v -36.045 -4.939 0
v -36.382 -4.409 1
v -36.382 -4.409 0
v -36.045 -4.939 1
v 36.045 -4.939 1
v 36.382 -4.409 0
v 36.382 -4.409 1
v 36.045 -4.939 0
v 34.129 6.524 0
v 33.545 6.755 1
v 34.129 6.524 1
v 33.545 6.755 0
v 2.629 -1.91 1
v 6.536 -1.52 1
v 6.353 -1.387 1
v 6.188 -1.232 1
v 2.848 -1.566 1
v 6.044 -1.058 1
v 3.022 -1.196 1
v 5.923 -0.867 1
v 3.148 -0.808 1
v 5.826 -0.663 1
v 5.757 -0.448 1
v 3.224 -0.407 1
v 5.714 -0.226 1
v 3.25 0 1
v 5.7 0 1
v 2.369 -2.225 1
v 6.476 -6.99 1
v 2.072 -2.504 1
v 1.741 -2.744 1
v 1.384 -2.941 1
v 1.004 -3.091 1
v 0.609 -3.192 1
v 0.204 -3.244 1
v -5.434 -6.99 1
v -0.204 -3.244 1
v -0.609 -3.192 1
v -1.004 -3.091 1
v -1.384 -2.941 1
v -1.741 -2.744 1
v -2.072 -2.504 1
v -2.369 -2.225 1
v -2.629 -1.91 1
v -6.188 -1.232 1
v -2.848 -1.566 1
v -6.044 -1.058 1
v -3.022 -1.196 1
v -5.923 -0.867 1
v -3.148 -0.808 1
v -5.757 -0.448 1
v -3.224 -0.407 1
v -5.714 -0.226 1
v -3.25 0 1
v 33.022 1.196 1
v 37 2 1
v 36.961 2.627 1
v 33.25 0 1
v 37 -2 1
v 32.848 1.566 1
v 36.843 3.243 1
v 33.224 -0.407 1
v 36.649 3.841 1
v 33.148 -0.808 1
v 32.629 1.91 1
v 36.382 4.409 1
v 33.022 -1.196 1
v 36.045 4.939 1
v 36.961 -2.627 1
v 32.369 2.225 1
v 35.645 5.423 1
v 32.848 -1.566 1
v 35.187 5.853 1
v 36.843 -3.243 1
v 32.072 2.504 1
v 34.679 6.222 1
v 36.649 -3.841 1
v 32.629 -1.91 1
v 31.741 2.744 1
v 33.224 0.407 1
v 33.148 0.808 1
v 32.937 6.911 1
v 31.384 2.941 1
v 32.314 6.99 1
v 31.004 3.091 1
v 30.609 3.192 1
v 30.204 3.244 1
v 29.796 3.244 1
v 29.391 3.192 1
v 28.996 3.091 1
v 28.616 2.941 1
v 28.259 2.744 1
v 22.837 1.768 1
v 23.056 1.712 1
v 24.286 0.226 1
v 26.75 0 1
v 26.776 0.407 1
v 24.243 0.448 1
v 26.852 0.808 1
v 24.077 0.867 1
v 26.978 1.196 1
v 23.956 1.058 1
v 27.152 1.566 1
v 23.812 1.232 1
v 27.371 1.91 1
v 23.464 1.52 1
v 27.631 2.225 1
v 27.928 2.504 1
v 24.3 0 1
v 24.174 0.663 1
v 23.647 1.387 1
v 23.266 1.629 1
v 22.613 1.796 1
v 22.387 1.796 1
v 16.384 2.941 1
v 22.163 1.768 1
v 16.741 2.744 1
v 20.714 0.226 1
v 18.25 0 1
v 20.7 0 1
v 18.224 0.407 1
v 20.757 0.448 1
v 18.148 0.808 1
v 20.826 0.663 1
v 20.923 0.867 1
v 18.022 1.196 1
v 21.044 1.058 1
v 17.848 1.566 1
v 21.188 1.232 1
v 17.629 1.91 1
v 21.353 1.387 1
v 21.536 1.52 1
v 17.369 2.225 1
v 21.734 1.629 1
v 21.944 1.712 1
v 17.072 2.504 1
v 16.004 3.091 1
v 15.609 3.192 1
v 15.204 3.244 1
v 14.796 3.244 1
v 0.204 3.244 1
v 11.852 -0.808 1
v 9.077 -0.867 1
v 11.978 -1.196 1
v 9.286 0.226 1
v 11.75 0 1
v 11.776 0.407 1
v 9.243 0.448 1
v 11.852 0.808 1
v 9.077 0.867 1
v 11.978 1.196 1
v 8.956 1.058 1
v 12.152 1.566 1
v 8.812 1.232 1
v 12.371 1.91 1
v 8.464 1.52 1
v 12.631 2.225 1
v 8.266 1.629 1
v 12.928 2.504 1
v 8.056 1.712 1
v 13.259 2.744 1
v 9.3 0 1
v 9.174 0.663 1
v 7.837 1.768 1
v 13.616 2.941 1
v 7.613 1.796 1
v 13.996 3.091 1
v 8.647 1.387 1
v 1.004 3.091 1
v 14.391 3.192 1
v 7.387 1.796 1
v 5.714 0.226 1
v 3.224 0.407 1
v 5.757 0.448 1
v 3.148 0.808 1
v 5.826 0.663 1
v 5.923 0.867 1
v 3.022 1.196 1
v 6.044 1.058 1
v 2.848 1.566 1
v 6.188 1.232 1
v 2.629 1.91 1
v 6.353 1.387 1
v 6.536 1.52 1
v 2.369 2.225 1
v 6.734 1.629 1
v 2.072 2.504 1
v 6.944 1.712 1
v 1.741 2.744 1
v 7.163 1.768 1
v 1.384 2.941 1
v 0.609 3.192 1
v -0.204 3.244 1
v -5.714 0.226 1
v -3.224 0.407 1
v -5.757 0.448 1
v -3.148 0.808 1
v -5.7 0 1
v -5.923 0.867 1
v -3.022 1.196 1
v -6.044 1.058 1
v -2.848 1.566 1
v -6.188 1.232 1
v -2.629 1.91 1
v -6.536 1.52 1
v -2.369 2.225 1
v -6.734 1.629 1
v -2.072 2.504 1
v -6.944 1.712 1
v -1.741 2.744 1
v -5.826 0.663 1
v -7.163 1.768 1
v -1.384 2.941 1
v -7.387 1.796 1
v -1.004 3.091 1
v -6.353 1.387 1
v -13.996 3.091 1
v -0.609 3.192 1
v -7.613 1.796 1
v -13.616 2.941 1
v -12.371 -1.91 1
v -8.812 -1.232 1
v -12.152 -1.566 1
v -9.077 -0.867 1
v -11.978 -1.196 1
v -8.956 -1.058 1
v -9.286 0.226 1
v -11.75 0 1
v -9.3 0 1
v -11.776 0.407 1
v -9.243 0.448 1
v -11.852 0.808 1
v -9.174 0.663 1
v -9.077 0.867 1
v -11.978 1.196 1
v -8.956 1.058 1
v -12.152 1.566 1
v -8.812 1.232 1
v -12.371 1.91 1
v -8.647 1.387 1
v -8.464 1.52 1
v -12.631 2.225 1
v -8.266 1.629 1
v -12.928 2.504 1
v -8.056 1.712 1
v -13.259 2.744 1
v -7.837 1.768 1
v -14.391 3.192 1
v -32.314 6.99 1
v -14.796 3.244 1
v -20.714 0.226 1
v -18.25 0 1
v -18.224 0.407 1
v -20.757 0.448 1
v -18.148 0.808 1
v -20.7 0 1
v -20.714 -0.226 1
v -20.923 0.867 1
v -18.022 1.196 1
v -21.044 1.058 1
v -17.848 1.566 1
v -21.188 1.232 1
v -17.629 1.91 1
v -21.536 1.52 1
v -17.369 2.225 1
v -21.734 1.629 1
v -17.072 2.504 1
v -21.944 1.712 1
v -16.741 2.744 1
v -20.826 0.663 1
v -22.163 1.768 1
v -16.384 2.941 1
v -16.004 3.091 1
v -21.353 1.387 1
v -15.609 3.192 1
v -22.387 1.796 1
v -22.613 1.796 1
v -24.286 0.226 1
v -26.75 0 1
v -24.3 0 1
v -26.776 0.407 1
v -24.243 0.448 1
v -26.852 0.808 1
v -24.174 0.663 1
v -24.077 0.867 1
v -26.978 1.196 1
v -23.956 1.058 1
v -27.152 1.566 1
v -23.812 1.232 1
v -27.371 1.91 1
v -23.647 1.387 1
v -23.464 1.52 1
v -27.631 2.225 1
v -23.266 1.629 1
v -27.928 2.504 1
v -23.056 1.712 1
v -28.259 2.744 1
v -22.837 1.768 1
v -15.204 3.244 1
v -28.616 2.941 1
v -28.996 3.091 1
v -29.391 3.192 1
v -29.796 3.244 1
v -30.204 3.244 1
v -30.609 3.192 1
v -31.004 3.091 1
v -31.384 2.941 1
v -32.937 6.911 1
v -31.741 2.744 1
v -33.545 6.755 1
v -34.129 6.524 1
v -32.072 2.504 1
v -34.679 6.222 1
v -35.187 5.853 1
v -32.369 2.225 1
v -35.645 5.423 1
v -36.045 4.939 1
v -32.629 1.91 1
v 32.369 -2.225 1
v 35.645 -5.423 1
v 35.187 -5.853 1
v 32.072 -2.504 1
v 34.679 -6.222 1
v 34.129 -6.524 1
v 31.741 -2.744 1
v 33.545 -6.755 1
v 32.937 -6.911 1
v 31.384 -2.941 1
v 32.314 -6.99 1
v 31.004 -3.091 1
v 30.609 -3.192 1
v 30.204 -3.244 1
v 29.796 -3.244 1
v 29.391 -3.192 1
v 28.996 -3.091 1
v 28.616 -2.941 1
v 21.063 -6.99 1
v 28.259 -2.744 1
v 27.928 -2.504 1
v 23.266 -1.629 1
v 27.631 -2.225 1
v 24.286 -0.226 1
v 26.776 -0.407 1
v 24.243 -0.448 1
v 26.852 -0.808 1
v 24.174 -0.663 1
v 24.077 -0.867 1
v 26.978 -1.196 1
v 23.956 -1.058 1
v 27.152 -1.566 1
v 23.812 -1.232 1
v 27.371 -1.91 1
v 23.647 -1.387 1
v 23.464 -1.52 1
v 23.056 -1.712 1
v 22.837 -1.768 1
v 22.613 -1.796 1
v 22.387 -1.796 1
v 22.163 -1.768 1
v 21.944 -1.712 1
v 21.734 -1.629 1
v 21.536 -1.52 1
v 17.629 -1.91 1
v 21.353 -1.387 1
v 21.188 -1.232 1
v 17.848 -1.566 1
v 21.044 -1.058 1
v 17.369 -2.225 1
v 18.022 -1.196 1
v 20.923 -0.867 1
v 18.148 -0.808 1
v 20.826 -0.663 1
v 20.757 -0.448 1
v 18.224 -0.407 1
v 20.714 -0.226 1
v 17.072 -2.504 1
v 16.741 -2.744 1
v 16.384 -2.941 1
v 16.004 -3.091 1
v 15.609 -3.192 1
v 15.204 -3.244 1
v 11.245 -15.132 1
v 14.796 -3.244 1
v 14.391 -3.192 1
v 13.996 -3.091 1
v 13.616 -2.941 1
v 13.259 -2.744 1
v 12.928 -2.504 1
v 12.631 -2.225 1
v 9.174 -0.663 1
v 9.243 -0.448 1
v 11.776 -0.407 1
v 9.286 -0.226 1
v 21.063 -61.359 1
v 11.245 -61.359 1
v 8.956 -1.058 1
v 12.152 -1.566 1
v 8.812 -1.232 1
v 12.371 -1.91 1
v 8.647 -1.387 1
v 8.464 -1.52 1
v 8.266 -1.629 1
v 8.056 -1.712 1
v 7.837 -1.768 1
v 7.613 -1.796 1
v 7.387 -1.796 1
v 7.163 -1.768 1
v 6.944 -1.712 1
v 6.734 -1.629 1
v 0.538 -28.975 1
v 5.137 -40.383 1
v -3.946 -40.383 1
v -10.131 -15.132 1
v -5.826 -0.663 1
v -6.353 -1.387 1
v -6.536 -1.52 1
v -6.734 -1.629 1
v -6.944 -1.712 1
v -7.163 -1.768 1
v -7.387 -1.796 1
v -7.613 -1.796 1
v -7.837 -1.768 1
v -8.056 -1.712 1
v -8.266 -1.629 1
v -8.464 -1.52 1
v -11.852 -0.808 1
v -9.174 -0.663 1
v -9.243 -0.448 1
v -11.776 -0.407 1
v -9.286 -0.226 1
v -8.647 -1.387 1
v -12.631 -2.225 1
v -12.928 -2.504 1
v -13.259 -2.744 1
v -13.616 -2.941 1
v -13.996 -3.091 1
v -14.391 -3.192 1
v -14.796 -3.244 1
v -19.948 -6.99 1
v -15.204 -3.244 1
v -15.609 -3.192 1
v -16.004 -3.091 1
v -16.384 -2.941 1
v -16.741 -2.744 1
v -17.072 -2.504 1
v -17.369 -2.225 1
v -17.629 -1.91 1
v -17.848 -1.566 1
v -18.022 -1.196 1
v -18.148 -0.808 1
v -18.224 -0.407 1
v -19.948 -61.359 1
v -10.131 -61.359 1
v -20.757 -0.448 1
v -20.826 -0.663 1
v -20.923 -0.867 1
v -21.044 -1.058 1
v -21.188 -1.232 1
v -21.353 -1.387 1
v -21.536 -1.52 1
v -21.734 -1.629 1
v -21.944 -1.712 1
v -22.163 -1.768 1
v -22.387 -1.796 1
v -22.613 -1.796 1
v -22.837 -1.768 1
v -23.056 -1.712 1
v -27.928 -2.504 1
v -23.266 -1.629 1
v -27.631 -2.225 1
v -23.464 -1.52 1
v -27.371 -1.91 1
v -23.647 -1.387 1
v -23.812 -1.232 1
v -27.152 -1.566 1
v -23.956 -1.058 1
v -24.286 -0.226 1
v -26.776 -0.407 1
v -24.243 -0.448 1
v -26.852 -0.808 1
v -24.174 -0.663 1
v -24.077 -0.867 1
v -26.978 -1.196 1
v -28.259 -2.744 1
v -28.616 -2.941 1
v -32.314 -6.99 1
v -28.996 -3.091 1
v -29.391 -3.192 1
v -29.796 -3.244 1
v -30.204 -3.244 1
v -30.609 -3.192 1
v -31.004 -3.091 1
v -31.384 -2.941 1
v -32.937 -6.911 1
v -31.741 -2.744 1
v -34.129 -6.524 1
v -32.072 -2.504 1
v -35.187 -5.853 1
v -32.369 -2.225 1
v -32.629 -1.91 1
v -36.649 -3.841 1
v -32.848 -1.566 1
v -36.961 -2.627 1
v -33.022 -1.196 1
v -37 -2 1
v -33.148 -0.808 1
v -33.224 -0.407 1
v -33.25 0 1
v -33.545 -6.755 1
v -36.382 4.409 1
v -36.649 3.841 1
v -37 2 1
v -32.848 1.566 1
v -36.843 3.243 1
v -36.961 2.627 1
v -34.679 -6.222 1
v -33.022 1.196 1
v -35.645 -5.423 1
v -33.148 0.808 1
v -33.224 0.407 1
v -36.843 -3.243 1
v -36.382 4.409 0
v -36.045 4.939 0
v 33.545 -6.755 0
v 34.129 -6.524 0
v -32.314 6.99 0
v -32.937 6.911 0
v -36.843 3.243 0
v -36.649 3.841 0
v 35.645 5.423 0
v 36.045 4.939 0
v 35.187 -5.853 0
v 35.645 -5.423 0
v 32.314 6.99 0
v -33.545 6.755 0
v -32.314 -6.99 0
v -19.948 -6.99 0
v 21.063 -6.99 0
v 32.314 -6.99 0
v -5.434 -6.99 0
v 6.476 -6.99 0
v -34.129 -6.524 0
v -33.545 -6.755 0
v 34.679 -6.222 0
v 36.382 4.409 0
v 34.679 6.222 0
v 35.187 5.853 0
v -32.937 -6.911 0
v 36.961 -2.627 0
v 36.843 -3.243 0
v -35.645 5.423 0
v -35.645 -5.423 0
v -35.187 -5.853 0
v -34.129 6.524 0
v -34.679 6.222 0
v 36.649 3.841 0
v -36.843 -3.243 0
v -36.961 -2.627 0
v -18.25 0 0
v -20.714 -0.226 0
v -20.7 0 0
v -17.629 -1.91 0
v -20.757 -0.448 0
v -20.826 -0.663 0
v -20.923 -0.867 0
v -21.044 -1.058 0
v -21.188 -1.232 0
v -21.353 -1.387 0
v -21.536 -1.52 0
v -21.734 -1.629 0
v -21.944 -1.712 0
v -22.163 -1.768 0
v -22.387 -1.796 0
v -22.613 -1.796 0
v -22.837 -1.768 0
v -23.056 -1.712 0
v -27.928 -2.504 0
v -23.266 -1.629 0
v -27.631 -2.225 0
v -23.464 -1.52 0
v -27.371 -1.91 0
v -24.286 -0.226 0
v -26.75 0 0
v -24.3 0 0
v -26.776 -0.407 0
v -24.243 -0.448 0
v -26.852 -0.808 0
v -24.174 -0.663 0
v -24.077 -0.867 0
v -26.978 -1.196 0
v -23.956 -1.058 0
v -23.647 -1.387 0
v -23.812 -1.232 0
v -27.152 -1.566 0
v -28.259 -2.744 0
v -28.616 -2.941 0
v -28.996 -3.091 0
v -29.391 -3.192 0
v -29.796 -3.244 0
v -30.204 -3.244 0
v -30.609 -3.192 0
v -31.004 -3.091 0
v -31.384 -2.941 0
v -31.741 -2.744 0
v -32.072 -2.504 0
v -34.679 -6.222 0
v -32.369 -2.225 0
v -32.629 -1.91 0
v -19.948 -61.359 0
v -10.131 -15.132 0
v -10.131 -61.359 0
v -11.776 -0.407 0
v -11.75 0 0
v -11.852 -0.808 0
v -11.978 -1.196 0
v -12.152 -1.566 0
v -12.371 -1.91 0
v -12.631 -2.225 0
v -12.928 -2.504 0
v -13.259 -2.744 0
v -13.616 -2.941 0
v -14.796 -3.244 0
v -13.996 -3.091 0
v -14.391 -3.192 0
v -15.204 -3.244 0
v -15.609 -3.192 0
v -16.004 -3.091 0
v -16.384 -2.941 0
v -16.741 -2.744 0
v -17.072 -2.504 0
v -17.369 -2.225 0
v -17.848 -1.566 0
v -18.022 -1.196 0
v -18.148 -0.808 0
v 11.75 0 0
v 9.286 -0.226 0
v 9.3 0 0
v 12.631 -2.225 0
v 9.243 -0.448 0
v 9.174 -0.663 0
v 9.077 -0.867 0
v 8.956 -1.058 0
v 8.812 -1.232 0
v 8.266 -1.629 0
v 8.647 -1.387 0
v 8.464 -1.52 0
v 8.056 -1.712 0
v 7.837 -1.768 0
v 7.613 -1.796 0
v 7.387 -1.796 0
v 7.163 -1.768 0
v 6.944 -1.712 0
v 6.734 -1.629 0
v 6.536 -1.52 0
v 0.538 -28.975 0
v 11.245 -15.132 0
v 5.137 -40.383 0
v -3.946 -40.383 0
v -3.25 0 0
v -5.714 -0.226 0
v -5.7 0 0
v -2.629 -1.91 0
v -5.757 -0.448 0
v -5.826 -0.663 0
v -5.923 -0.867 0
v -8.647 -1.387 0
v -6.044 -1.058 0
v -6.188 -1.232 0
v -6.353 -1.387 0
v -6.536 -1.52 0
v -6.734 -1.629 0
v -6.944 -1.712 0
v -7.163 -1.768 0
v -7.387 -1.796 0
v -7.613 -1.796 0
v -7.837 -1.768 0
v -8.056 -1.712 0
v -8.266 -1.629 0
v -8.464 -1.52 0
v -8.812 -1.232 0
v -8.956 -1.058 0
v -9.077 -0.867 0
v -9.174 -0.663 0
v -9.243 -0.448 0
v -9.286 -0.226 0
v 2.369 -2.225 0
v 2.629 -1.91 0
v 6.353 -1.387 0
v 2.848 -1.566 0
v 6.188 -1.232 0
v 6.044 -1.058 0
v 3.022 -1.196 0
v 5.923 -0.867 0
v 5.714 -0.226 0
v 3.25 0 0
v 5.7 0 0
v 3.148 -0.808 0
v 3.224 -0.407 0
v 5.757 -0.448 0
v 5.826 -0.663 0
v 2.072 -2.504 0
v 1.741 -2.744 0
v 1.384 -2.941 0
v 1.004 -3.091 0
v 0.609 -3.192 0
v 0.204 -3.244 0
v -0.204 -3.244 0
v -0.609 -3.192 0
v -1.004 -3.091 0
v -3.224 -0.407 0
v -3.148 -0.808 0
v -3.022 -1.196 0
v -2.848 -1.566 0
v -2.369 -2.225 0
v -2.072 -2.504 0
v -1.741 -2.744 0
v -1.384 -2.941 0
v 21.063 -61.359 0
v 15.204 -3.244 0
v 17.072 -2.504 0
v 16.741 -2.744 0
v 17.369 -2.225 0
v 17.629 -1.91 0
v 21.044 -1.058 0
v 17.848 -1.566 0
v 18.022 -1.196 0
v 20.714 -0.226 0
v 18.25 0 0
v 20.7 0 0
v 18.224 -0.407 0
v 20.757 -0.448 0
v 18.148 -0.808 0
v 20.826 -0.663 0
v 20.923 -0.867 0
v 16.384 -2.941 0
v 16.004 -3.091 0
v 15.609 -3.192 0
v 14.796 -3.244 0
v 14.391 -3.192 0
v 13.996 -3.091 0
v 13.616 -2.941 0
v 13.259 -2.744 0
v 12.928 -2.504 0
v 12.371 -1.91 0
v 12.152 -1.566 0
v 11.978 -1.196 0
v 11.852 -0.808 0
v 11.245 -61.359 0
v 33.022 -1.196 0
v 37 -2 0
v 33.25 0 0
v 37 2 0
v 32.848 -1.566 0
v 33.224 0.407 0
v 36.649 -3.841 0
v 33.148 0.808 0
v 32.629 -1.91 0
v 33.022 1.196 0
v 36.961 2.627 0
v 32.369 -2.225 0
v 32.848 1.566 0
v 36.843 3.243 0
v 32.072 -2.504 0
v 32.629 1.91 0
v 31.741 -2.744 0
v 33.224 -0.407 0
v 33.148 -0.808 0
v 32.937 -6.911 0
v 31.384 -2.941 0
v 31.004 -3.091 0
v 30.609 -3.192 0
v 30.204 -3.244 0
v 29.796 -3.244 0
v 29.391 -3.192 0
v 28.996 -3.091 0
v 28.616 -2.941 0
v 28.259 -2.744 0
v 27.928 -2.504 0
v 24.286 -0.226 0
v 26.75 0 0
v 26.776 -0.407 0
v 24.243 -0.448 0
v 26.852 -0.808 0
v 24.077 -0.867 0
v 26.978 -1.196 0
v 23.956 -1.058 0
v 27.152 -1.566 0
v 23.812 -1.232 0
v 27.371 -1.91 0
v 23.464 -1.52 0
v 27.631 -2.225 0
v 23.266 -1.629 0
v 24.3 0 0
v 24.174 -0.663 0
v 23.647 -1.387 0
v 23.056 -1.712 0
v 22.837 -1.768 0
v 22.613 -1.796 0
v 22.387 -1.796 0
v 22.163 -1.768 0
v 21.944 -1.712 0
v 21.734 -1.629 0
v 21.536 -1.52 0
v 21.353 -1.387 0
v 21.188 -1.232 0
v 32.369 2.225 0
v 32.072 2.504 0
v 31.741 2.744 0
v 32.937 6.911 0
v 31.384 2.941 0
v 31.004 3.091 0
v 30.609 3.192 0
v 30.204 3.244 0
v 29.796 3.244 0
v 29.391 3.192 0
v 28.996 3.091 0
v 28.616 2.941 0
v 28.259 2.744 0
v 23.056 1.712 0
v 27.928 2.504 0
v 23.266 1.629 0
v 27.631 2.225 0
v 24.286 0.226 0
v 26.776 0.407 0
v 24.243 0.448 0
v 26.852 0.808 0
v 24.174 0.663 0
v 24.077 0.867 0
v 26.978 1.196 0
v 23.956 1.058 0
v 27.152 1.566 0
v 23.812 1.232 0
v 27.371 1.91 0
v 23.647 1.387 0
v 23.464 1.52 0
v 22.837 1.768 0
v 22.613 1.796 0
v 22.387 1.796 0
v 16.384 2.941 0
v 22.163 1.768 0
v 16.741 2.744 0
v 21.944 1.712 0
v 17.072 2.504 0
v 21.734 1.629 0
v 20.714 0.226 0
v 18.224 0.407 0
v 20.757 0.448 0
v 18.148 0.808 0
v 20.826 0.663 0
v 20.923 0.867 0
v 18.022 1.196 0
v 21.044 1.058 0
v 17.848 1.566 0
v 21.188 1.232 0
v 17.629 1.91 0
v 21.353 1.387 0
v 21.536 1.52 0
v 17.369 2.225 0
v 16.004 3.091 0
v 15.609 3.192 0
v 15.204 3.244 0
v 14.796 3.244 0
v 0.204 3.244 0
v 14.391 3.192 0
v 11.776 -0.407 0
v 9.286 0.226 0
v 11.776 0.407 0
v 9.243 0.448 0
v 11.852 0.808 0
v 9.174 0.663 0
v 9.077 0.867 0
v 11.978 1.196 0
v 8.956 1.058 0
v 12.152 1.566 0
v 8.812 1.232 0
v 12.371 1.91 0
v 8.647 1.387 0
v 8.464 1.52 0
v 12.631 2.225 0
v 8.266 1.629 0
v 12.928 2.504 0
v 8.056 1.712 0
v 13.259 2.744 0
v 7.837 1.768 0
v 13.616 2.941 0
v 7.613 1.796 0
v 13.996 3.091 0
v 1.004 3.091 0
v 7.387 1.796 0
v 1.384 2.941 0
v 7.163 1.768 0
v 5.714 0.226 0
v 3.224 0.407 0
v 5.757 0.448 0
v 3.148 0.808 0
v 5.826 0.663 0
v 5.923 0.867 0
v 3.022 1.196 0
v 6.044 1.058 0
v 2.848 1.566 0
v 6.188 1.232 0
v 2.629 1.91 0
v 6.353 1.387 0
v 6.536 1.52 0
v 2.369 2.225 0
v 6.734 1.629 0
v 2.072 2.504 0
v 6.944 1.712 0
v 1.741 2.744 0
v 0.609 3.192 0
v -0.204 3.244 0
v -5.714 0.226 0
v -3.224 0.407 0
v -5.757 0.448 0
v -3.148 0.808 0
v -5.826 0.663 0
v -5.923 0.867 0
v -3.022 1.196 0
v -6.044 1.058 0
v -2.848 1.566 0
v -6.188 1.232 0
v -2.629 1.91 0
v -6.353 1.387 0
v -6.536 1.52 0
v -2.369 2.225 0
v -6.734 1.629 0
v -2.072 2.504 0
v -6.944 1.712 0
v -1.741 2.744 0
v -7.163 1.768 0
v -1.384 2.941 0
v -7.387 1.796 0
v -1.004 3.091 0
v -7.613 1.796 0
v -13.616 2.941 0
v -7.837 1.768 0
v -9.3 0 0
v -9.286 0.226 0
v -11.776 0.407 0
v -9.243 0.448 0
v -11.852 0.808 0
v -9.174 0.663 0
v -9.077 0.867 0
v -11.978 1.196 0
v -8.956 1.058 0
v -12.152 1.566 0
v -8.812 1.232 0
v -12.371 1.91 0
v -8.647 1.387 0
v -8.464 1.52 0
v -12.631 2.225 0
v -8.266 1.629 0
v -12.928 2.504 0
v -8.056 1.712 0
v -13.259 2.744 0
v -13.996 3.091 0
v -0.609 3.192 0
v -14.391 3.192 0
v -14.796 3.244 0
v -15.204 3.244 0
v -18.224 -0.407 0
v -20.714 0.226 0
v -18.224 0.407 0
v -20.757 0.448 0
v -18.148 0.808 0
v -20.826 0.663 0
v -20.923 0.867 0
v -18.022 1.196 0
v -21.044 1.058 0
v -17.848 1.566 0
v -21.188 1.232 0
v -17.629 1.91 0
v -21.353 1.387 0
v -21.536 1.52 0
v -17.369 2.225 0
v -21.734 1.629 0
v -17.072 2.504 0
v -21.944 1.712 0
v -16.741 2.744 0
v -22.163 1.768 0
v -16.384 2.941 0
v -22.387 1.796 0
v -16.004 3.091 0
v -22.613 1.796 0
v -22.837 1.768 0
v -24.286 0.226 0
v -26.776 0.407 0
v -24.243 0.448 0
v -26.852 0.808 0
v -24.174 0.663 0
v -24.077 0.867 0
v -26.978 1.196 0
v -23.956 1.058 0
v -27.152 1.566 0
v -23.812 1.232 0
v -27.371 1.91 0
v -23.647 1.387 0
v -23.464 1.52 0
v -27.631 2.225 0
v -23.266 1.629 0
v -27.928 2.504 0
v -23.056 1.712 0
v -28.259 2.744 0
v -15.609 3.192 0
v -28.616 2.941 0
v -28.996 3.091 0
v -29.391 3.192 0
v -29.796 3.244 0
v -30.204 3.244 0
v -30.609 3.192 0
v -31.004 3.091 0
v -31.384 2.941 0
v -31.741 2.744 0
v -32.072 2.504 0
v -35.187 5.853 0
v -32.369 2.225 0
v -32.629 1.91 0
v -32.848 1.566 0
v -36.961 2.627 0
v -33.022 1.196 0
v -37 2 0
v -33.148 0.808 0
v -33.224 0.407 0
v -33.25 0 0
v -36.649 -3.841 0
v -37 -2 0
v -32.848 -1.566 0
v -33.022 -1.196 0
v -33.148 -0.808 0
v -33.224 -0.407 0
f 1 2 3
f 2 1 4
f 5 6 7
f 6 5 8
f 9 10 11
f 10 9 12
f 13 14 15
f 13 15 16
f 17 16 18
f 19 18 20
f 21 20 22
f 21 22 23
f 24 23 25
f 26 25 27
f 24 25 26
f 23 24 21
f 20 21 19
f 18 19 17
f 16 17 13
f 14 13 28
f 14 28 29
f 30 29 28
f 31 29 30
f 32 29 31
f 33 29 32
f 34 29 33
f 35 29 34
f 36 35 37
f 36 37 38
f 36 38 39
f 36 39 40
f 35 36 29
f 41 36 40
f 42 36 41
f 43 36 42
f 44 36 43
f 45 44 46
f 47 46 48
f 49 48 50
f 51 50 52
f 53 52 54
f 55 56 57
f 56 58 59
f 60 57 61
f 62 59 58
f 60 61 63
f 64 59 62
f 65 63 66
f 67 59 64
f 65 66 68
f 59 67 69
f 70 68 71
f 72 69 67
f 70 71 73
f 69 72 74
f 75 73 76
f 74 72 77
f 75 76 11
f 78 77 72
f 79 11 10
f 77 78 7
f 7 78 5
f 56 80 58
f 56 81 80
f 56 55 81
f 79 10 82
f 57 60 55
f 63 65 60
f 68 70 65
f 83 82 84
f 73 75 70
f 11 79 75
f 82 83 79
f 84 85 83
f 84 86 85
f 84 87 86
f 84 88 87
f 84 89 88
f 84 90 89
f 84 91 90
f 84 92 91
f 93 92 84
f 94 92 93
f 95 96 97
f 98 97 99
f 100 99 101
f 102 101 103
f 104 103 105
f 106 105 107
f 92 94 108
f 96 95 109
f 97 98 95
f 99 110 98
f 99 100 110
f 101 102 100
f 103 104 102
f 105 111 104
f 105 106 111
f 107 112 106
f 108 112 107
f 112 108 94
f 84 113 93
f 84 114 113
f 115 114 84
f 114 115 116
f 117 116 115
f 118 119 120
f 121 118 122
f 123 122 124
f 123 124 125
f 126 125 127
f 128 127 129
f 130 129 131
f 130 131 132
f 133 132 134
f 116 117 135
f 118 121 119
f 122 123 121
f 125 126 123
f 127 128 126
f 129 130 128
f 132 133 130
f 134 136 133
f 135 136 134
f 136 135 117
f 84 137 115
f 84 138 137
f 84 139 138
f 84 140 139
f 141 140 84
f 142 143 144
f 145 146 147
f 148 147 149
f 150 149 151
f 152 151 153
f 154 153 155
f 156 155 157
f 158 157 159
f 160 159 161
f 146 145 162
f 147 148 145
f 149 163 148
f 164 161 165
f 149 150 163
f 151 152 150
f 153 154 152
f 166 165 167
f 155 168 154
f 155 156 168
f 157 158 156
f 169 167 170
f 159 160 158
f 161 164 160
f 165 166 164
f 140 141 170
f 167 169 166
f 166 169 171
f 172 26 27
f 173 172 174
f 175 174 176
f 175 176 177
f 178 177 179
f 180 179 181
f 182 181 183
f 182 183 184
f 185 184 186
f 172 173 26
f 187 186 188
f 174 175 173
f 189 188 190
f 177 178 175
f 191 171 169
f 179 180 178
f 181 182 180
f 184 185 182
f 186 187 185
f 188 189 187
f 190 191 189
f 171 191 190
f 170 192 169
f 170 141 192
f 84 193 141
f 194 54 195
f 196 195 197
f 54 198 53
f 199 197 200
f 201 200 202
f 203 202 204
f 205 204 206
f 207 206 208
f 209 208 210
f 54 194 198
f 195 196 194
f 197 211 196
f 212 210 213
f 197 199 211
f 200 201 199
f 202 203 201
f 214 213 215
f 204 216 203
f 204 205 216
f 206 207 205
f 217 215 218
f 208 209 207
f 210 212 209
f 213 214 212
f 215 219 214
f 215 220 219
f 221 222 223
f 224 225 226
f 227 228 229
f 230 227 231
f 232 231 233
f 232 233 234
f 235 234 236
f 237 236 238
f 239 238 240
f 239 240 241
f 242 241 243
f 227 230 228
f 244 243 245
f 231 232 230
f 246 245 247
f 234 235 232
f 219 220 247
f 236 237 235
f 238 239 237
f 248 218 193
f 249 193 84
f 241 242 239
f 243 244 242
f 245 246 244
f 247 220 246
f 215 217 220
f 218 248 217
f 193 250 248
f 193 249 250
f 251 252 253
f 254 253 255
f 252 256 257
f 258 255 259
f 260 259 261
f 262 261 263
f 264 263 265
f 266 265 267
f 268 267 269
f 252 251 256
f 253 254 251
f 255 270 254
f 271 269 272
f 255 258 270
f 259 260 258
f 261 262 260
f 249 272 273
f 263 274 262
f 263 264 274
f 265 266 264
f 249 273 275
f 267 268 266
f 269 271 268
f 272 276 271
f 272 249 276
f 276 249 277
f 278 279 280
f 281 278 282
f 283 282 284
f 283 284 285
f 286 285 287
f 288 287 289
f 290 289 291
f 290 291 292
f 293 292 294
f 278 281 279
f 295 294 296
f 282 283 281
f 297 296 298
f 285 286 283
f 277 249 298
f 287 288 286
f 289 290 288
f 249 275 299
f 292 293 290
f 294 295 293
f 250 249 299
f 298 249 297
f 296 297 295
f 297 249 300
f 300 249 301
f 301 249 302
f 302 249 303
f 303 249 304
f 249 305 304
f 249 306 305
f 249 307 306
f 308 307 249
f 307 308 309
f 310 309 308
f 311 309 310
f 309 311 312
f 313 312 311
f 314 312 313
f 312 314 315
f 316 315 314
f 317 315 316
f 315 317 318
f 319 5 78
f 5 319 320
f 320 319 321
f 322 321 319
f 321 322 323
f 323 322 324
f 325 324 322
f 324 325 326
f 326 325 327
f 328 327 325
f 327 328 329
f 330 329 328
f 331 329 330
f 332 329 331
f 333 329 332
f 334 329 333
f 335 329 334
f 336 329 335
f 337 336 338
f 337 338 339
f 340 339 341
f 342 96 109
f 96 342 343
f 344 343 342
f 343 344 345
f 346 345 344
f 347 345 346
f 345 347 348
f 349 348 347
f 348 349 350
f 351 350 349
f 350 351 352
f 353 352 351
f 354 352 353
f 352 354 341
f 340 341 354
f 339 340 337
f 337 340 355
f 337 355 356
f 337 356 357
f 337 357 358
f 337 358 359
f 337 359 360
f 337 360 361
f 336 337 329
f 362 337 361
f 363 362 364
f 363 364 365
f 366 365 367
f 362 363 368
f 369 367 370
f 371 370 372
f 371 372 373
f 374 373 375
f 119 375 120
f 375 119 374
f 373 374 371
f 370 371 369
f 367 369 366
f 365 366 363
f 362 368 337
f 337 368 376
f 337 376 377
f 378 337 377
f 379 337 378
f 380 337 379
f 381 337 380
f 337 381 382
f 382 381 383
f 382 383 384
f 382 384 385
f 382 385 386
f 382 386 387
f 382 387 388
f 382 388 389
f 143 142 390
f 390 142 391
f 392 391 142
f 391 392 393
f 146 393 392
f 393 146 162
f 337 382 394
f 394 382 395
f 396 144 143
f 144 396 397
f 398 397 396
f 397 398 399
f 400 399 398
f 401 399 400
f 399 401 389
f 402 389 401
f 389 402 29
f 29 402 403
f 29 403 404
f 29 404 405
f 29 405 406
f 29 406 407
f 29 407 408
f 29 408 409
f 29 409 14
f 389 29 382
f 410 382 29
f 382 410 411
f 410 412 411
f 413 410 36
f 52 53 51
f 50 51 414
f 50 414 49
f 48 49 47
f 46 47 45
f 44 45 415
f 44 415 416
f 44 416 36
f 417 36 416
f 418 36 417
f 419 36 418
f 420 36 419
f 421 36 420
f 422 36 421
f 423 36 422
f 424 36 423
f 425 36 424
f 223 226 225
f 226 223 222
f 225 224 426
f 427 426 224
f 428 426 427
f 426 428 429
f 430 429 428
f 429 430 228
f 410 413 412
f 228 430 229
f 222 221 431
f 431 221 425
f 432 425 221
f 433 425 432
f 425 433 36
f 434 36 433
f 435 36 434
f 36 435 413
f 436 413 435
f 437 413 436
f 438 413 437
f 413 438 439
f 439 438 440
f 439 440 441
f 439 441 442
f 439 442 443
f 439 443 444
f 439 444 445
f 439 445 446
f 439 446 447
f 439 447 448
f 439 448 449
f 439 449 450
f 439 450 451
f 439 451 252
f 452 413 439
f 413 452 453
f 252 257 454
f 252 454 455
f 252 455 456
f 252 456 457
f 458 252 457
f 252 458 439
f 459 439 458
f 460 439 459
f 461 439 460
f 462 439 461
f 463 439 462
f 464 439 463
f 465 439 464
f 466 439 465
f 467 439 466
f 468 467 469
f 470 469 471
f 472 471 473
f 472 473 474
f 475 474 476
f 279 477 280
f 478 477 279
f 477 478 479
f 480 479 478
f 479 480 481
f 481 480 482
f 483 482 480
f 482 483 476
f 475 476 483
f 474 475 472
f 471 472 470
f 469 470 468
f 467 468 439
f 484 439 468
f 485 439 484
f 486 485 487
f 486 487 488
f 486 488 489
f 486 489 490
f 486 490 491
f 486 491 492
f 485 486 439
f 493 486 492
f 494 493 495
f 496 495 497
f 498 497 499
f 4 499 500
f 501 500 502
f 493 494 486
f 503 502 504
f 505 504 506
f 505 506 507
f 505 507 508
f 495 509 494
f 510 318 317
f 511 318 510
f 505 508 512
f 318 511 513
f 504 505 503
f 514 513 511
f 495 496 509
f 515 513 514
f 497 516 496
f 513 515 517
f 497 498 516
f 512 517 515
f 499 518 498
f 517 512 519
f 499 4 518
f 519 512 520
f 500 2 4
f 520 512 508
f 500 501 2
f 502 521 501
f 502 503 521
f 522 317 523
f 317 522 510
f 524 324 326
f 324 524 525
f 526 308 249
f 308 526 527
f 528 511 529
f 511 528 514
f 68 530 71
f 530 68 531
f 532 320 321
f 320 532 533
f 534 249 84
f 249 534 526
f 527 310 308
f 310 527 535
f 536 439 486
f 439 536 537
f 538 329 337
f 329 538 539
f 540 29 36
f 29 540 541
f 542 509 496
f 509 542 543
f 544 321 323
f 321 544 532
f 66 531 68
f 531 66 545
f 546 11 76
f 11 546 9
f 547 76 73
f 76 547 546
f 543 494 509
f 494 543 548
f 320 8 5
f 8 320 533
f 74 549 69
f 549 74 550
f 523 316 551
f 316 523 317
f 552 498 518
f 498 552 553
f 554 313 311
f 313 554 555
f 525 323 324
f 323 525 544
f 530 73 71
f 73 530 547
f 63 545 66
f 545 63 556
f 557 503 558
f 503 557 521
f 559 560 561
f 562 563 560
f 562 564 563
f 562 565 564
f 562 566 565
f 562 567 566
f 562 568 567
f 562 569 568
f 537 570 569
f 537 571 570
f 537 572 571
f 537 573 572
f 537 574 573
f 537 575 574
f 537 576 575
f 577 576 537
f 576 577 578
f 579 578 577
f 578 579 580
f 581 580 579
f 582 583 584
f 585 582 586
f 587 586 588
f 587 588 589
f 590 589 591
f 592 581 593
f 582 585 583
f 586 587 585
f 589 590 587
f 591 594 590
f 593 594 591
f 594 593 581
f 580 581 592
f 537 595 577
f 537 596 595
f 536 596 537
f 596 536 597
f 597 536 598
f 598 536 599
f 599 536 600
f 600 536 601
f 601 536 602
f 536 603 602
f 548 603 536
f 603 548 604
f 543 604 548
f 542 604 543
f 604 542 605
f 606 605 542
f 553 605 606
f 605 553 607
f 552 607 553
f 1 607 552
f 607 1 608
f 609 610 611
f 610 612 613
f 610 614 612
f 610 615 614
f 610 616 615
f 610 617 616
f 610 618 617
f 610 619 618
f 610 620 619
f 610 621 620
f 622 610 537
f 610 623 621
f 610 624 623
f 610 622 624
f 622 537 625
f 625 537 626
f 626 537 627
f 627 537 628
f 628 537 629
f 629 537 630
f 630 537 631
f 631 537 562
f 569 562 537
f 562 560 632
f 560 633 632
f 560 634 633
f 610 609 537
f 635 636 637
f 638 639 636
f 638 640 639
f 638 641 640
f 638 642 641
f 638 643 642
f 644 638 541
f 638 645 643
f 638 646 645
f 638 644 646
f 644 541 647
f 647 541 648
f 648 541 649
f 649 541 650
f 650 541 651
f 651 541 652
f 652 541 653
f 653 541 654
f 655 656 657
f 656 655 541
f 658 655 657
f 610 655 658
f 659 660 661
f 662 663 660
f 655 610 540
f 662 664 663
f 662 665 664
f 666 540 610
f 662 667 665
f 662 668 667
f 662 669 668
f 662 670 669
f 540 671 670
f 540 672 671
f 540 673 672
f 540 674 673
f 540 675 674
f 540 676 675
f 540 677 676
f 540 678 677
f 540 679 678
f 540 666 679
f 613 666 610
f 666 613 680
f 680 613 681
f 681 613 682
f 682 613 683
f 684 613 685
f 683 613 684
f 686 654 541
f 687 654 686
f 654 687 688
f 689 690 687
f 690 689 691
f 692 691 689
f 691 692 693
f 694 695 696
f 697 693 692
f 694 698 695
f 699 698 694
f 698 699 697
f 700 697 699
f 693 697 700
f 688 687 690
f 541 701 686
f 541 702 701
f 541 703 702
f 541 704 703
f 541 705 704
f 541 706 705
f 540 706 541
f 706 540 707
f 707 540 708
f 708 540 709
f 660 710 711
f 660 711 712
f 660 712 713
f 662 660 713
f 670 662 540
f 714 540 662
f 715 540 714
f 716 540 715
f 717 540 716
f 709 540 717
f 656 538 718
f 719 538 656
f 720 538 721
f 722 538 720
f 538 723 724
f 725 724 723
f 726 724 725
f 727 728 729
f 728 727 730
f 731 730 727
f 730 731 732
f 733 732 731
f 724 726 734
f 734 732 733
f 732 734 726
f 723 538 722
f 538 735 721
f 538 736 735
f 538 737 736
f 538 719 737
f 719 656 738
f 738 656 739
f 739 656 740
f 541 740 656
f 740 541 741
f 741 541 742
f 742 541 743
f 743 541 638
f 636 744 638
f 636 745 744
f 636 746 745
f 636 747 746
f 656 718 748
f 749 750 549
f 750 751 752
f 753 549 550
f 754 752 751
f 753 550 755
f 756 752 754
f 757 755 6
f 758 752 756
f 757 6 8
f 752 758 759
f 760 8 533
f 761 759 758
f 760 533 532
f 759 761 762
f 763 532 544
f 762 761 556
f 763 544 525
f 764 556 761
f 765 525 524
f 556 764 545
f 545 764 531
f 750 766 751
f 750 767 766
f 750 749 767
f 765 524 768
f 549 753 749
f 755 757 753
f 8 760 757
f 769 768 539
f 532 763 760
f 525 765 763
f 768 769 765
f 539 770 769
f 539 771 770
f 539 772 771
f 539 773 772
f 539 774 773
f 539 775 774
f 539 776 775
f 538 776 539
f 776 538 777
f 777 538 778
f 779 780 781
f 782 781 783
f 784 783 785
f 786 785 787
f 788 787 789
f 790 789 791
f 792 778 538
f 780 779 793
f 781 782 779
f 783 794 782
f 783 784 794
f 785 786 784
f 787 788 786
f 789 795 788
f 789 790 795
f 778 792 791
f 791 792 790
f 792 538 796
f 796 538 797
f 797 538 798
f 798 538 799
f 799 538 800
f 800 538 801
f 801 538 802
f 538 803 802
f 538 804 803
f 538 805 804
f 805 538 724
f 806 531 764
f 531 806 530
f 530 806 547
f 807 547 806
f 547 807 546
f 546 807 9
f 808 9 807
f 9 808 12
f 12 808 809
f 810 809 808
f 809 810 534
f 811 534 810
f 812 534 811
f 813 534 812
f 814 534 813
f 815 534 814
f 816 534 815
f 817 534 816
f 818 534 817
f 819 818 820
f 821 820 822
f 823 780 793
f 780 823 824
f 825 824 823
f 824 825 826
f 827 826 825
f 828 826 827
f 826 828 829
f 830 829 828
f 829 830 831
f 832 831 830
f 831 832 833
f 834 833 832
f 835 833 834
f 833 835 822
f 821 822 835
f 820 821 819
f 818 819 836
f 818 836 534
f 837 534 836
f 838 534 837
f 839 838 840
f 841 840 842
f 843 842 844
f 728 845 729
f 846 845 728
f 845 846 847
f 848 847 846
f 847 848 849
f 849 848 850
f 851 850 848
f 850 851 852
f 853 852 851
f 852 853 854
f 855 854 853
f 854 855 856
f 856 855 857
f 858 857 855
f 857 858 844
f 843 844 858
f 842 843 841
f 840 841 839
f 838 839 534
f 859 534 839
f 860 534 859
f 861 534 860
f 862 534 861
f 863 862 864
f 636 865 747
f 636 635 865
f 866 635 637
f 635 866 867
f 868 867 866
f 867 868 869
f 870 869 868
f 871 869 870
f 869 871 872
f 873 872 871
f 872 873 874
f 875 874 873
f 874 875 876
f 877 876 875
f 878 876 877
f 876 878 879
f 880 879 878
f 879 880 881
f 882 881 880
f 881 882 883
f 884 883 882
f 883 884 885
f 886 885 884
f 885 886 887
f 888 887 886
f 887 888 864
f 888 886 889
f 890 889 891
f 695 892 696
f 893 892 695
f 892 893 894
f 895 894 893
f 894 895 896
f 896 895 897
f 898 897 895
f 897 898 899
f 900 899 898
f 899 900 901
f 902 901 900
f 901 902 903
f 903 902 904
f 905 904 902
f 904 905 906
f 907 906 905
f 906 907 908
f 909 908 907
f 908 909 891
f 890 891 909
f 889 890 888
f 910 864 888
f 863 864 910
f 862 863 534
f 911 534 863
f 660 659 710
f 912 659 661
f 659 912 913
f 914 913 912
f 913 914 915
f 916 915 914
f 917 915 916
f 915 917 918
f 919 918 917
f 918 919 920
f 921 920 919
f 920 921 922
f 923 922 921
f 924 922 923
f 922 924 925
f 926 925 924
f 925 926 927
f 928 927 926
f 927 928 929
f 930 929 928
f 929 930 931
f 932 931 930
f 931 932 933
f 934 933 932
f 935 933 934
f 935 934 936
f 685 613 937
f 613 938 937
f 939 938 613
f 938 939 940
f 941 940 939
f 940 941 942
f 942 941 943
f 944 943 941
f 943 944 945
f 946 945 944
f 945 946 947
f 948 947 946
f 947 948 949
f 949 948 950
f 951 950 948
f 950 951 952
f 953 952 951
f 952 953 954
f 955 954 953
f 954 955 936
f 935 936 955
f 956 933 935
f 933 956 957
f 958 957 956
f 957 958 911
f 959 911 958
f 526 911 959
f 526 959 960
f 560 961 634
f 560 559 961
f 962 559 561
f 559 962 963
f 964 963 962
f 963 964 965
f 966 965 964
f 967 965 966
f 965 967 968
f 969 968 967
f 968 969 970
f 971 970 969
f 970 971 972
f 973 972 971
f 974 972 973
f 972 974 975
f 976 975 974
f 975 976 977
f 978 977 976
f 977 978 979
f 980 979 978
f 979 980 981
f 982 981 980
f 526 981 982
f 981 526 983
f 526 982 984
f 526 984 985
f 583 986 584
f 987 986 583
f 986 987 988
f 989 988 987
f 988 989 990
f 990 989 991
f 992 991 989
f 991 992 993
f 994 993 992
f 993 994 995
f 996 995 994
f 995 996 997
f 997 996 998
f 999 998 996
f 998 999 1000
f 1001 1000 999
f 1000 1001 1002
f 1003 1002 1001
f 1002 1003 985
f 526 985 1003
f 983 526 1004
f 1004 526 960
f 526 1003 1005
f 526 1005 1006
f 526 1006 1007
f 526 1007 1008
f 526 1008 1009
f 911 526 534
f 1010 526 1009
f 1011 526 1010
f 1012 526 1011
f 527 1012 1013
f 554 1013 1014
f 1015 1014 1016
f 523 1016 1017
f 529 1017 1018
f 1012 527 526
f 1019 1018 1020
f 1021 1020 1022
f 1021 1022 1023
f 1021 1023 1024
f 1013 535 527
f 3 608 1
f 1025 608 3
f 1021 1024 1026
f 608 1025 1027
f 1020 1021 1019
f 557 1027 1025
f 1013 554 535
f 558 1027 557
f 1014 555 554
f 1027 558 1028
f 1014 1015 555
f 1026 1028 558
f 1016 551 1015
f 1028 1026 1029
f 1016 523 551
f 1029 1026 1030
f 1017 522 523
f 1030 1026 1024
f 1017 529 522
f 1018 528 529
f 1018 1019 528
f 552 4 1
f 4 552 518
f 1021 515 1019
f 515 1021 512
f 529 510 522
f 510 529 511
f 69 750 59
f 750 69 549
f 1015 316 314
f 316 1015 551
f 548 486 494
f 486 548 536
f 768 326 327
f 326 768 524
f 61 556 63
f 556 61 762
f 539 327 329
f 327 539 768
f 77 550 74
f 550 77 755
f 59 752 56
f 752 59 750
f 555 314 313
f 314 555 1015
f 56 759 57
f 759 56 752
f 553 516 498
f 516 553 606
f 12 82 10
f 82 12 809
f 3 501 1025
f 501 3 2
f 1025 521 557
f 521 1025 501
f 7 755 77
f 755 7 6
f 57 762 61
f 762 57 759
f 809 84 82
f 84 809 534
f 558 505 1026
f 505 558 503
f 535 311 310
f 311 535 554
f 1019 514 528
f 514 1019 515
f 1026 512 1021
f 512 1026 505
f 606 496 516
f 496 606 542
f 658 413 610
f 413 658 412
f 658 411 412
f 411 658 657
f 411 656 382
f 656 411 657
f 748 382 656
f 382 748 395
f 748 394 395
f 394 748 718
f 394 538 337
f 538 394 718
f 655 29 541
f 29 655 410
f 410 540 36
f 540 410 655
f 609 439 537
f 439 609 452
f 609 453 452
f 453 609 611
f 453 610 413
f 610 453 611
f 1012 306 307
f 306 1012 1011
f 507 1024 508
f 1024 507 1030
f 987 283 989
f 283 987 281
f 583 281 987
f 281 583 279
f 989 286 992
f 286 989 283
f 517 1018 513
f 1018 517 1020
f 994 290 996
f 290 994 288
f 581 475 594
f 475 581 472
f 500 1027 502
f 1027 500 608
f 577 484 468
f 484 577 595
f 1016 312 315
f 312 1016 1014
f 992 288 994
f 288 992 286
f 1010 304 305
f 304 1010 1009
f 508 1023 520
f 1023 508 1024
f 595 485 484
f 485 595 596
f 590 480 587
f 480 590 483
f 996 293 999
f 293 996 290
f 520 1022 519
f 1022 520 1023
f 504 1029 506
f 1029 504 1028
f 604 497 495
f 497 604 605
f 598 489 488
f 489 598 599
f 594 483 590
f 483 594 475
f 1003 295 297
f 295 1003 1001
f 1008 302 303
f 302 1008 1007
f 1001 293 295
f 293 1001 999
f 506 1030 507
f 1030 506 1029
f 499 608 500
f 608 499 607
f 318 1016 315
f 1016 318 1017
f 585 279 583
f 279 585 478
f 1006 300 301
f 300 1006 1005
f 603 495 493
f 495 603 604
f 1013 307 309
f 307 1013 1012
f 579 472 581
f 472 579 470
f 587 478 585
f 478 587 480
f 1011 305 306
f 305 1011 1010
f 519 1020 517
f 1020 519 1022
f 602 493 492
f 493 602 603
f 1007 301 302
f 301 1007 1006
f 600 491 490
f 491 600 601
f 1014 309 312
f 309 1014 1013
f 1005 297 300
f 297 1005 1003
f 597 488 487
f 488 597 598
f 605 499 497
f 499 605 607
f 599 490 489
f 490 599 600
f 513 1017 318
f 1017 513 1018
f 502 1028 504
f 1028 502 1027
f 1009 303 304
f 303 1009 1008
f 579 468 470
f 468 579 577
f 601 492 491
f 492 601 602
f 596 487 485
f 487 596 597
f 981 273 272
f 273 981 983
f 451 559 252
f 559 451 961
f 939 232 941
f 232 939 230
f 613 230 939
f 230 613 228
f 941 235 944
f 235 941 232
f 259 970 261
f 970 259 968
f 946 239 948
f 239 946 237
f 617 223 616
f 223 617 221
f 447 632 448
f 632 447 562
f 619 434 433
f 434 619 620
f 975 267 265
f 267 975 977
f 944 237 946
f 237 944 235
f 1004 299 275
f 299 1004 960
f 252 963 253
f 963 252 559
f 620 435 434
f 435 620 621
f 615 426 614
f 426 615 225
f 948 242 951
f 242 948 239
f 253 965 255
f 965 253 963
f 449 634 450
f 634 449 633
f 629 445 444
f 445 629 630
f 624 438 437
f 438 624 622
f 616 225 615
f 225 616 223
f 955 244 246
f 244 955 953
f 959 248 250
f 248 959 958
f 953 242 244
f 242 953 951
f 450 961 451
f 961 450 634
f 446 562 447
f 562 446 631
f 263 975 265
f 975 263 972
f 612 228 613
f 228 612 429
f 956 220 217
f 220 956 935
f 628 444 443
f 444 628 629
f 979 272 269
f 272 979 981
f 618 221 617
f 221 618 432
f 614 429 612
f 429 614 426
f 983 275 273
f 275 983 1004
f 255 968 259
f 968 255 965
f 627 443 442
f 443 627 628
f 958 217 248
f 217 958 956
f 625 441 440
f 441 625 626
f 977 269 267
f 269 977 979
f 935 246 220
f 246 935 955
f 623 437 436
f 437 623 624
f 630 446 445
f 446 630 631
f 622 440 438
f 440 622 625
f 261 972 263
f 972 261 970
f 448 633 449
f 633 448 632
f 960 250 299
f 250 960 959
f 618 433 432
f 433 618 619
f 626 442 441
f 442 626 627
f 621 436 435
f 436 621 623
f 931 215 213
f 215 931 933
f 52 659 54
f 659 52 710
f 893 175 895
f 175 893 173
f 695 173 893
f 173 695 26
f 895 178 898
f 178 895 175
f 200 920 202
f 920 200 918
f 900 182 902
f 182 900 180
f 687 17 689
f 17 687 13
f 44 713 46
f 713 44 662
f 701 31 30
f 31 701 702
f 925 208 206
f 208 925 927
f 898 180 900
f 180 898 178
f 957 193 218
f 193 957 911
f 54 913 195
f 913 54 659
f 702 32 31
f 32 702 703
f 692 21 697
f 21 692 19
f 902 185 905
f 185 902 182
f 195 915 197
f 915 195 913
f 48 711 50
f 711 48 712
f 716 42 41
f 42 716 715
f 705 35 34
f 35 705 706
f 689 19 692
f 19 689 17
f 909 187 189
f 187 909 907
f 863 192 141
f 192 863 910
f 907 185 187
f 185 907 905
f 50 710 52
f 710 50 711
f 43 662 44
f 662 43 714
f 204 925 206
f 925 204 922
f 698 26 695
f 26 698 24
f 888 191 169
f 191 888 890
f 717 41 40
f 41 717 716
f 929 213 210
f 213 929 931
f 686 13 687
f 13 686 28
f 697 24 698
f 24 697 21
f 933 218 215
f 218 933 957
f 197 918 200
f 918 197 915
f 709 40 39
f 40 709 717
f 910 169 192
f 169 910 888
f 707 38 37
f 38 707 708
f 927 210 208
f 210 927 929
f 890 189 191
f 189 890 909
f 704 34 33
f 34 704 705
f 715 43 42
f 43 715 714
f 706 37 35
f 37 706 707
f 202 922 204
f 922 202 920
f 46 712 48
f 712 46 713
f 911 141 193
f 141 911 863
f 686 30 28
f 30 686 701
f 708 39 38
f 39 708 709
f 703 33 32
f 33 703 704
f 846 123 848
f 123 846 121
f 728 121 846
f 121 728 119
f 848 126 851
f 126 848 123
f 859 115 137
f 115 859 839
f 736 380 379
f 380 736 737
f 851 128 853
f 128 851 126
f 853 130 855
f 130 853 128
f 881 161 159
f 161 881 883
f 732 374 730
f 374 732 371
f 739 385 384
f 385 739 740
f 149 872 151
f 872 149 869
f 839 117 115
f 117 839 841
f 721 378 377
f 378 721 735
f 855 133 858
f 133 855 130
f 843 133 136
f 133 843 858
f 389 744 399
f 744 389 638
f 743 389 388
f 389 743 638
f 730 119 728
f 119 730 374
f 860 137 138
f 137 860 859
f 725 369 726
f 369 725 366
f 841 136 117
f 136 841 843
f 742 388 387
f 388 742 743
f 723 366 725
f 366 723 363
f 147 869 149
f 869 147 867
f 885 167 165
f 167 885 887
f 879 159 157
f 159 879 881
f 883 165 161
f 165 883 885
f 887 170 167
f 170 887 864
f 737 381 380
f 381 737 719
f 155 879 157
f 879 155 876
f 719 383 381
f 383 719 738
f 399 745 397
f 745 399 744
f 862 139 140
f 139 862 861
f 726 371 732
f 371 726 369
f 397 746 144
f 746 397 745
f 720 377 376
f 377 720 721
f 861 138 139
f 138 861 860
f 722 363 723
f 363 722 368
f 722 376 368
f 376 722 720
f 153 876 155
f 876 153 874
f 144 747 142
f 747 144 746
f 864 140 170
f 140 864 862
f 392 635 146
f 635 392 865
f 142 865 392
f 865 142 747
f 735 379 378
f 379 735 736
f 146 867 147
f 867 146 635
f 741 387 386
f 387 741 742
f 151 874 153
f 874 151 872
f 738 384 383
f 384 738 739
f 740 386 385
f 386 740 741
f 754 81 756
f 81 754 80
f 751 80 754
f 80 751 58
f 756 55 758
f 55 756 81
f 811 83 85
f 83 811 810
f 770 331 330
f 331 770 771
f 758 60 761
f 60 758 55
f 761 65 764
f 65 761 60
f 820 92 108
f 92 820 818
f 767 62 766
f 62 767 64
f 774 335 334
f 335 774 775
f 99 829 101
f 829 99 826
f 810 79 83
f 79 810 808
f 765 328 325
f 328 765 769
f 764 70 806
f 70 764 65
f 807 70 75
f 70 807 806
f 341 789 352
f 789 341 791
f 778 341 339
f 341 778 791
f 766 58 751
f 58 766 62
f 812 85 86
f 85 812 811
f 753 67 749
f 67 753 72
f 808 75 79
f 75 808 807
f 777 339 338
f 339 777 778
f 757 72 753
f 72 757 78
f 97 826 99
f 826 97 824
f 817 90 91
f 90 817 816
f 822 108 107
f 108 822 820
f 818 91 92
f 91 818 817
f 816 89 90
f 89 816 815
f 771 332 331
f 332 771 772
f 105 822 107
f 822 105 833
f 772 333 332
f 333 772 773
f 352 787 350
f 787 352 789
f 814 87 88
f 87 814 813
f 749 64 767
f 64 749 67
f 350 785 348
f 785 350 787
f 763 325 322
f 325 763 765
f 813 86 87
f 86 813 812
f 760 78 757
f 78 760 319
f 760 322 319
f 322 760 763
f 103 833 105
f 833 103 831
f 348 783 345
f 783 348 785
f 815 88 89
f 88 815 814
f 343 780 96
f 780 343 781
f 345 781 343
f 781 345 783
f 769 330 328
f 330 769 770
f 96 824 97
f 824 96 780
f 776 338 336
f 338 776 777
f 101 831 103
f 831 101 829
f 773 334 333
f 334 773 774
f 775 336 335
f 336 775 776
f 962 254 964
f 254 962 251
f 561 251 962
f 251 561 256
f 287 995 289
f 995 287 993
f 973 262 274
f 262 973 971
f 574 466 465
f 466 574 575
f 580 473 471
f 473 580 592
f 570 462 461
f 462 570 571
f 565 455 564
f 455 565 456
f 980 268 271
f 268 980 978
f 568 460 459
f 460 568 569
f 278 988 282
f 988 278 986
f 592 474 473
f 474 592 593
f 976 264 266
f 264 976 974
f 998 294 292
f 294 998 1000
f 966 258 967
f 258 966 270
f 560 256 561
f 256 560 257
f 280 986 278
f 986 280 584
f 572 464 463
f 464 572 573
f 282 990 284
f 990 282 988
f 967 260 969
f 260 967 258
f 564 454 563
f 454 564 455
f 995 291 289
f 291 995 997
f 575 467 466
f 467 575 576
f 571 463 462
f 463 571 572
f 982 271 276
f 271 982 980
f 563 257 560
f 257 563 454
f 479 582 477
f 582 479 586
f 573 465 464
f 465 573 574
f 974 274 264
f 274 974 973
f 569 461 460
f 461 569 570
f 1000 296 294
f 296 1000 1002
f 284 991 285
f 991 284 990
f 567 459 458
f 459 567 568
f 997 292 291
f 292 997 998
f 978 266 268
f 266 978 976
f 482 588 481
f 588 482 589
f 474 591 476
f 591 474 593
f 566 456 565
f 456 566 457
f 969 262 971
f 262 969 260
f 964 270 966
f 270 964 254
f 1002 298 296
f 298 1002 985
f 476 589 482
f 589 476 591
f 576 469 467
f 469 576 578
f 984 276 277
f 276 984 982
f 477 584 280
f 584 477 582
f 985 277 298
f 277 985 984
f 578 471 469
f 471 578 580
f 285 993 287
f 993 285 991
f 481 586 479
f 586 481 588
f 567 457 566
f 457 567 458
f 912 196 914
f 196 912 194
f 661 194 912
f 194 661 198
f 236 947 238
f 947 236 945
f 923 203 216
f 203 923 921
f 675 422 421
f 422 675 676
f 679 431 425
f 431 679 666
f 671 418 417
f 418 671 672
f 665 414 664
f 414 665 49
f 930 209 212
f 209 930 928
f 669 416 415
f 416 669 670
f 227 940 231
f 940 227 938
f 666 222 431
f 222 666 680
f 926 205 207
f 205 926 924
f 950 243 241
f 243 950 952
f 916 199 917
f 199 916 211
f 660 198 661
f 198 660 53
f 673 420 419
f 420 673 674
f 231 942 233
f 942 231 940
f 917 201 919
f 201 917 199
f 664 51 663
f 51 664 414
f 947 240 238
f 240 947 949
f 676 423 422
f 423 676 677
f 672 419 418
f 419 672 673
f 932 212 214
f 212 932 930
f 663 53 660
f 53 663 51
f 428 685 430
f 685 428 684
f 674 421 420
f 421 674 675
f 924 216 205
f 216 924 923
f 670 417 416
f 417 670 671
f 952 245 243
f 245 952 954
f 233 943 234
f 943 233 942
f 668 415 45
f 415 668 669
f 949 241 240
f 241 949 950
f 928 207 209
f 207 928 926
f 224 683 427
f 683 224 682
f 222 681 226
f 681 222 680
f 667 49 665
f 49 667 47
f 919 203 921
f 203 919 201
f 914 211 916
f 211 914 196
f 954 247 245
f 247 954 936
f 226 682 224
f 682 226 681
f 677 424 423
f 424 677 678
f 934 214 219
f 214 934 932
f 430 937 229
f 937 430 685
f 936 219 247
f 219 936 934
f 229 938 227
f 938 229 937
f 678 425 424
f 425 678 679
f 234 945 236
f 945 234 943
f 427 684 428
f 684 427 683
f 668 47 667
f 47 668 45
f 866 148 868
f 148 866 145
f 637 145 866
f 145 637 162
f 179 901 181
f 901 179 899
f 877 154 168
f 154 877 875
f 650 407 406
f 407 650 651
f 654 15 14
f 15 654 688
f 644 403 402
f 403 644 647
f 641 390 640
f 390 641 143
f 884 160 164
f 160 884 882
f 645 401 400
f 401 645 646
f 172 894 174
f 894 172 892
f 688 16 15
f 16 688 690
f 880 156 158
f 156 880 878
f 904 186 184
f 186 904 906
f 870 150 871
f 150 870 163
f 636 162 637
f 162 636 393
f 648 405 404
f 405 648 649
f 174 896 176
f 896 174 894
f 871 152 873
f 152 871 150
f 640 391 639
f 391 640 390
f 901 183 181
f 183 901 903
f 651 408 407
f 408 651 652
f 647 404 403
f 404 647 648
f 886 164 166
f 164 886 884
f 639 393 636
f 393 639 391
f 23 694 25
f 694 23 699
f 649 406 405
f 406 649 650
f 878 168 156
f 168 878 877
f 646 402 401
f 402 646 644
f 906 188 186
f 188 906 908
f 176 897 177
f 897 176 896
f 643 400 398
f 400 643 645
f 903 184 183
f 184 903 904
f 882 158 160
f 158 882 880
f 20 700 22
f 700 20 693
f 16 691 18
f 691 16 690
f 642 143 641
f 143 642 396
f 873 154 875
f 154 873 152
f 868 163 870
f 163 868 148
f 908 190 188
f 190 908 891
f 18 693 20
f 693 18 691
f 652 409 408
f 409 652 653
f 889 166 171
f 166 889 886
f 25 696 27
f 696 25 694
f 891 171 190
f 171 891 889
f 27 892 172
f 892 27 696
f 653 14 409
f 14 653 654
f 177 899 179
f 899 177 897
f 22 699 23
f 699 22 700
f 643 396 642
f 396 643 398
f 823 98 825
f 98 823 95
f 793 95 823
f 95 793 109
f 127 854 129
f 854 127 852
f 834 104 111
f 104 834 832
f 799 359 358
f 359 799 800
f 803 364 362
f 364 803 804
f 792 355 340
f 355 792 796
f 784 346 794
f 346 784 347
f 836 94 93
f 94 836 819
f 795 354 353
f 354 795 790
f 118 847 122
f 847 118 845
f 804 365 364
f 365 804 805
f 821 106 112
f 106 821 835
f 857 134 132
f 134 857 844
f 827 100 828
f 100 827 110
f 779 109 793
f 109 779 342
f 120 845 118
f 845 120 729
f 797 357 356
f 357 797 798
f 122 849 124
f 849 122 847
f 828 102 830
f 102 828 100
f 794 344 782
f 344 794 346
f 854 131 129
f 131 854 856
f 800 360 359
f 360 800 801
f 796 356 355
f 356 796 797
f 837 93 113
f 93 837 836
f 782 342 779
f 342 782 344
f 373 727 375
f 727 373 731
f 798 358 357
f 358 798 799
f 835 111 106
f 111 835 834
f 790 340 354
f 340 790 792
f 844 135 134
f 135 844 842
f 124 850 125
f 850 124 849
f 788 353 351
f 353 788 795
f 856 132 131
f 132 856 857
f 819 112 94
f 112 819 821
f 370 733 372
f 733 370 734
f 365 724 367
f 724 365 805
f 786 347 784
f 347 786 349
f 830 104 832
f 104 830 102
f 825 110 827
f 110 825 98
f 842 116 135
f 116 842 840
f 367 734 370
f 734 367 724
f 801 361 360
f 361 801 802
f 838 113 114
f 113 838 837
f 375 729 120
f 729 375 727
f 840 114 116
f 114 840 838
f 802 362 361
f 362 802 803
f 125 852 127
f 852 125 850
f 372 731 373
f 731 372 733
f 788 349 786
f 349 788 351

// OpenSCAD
$fn = 50;


difference() {
	union() {
		*color(alpha = 1.0000000000, c = "gray") {
			translate(v = [0, 14, 0]) {
				linear_extrude(height = 1) {
					text(font = "Arial:style=Bold", halign = "center", size = 4.5000000000, text = "COMMENT description oobb_plate_shape_p_type_1_depth_5_width_1_thickness_m_extra_oobb_size", valign = "center");
				}
			}
		}
		hull() {
			translate(v = [-32.0000000000, 2.0000000000, 0]) {
				cylinder(h = 1, r = 5);
			}
			translate(v = [32.0000000000, 2.0000000000, 0]) {
				cylinder(h = 1, r = 5);
			}
			translate(v = [-32.0000000000, -2.0000000000, 0]) {
				cylinder(h = 1, r = 5);
			}
			translate(v = [32.0000000000, -2.0000000000, 0]) {
				cylinder(h = 1, r = 5);
			}
		}
		translate(v = [0, -5, 0]) {
			linear_extrude(height = 1) {
				text(font = "DejaVu Sans Mono:style=Bold", halign = "center", size = 57.0000000000, text = "M", valign = "top");
			}
		}
	}
	union() {
		*color(alpha = 1.0000000000, c = "gray") {
			translate(v = [0, 14, 0]) {
				linear_extrude(height = 1) {
					text(font = "Arial:style=Bold", halign = "center", size = 4.5000000000, text = "COMMENT description oobb_holes_shape_n_type_5_width_1_thickness_m_extra_oobb_size_1_height_'all'_holes_true_both_holes", valign = "center");
				}
			}
		}
		translate(v = [-30.0000000000, 0.0000000000, 0]) {
			translate(v = [0, 0, -50]) {
				cylinder(h = 100, r = 3.2500000000);
			}
		}
		translate(v = [-15.0000000000, 0.0000000000, 0]) {
			translate(v = [0, 0, -50]) {
				cylinder(h = 100, r = 3.2500000000);
			}
		}
		translate(v = [0, 0, -50]) {
			cylinder(h = 100, r = 3.2500000000);
		}
		translate(v = [15.0000000000, 0.0000000000, 0]) {
			translate(v = [0, 0, -50]) {
				cylinder(h = 100, r = 3.2500000000);
			}
		}
		translate(v = [30.0000000000, 0.0000000000, 0]) {
			translate(v = [0, 0, -50]) {
				cylinder(h = 100, r = 3.2500000000);
			}
		}
		translate(v = [-30.0000000000, 0.0000000000, 0]) {
			translate(v = [0, 0, -50]) {
				cylinder(h = 100, r = 1.8000000000);
			}
		}
		translate(v = [-22.5000000000, 0.0000000000, 0]) {
			translate(v = [0, 0, -50]) {
				cylinder(h = 100, r = 1.8000000000);
			}
		}
		translate(v = [-15.0000000000, 0.0000000000, 0]) {
			translate(v = [0, 0, -50]) {
				cylinder(h = 100, r = 1.8000000000);
			}
		}
		translate(v = [-7.5000000000, 0.0000000000, 0]) {
			translate(v = [0, 0, -50]) {
				cylinder(h = 100, r = 1.8000000000);
			}
		}
		translate(v = [0, 0, -50]) {
			cylinder(h = 100, r = 1.8000000000);
		}
		translate(v = [7.5000000000, 0.0000000000, 0]) {
			translate(v = [0, 0, -50]) {
				cylinder(h = 100, r = 1.8000000000);
			}
		}
		translate(v = [15.0000000000, 0.0000000000, 0]) {
			translate(v = [0, 0, -50]) {
				cylinder(h = 100, r = 1.8000000000);
			}
		}
		translate(v = [22.5000000000, 0.0000000000, 0]) {
			translate(v = [0, 0, -50]) {
				cylinder(h = 100, r = 1.8000000000);
			}
		}
		translate(v = [30.0000000000, 0.0000000000, 0]) {
			translate(v = [0, 0, -50]) {
				cylinder(h = 100, r = 1.8000000000);
			}
		}
	}
}
